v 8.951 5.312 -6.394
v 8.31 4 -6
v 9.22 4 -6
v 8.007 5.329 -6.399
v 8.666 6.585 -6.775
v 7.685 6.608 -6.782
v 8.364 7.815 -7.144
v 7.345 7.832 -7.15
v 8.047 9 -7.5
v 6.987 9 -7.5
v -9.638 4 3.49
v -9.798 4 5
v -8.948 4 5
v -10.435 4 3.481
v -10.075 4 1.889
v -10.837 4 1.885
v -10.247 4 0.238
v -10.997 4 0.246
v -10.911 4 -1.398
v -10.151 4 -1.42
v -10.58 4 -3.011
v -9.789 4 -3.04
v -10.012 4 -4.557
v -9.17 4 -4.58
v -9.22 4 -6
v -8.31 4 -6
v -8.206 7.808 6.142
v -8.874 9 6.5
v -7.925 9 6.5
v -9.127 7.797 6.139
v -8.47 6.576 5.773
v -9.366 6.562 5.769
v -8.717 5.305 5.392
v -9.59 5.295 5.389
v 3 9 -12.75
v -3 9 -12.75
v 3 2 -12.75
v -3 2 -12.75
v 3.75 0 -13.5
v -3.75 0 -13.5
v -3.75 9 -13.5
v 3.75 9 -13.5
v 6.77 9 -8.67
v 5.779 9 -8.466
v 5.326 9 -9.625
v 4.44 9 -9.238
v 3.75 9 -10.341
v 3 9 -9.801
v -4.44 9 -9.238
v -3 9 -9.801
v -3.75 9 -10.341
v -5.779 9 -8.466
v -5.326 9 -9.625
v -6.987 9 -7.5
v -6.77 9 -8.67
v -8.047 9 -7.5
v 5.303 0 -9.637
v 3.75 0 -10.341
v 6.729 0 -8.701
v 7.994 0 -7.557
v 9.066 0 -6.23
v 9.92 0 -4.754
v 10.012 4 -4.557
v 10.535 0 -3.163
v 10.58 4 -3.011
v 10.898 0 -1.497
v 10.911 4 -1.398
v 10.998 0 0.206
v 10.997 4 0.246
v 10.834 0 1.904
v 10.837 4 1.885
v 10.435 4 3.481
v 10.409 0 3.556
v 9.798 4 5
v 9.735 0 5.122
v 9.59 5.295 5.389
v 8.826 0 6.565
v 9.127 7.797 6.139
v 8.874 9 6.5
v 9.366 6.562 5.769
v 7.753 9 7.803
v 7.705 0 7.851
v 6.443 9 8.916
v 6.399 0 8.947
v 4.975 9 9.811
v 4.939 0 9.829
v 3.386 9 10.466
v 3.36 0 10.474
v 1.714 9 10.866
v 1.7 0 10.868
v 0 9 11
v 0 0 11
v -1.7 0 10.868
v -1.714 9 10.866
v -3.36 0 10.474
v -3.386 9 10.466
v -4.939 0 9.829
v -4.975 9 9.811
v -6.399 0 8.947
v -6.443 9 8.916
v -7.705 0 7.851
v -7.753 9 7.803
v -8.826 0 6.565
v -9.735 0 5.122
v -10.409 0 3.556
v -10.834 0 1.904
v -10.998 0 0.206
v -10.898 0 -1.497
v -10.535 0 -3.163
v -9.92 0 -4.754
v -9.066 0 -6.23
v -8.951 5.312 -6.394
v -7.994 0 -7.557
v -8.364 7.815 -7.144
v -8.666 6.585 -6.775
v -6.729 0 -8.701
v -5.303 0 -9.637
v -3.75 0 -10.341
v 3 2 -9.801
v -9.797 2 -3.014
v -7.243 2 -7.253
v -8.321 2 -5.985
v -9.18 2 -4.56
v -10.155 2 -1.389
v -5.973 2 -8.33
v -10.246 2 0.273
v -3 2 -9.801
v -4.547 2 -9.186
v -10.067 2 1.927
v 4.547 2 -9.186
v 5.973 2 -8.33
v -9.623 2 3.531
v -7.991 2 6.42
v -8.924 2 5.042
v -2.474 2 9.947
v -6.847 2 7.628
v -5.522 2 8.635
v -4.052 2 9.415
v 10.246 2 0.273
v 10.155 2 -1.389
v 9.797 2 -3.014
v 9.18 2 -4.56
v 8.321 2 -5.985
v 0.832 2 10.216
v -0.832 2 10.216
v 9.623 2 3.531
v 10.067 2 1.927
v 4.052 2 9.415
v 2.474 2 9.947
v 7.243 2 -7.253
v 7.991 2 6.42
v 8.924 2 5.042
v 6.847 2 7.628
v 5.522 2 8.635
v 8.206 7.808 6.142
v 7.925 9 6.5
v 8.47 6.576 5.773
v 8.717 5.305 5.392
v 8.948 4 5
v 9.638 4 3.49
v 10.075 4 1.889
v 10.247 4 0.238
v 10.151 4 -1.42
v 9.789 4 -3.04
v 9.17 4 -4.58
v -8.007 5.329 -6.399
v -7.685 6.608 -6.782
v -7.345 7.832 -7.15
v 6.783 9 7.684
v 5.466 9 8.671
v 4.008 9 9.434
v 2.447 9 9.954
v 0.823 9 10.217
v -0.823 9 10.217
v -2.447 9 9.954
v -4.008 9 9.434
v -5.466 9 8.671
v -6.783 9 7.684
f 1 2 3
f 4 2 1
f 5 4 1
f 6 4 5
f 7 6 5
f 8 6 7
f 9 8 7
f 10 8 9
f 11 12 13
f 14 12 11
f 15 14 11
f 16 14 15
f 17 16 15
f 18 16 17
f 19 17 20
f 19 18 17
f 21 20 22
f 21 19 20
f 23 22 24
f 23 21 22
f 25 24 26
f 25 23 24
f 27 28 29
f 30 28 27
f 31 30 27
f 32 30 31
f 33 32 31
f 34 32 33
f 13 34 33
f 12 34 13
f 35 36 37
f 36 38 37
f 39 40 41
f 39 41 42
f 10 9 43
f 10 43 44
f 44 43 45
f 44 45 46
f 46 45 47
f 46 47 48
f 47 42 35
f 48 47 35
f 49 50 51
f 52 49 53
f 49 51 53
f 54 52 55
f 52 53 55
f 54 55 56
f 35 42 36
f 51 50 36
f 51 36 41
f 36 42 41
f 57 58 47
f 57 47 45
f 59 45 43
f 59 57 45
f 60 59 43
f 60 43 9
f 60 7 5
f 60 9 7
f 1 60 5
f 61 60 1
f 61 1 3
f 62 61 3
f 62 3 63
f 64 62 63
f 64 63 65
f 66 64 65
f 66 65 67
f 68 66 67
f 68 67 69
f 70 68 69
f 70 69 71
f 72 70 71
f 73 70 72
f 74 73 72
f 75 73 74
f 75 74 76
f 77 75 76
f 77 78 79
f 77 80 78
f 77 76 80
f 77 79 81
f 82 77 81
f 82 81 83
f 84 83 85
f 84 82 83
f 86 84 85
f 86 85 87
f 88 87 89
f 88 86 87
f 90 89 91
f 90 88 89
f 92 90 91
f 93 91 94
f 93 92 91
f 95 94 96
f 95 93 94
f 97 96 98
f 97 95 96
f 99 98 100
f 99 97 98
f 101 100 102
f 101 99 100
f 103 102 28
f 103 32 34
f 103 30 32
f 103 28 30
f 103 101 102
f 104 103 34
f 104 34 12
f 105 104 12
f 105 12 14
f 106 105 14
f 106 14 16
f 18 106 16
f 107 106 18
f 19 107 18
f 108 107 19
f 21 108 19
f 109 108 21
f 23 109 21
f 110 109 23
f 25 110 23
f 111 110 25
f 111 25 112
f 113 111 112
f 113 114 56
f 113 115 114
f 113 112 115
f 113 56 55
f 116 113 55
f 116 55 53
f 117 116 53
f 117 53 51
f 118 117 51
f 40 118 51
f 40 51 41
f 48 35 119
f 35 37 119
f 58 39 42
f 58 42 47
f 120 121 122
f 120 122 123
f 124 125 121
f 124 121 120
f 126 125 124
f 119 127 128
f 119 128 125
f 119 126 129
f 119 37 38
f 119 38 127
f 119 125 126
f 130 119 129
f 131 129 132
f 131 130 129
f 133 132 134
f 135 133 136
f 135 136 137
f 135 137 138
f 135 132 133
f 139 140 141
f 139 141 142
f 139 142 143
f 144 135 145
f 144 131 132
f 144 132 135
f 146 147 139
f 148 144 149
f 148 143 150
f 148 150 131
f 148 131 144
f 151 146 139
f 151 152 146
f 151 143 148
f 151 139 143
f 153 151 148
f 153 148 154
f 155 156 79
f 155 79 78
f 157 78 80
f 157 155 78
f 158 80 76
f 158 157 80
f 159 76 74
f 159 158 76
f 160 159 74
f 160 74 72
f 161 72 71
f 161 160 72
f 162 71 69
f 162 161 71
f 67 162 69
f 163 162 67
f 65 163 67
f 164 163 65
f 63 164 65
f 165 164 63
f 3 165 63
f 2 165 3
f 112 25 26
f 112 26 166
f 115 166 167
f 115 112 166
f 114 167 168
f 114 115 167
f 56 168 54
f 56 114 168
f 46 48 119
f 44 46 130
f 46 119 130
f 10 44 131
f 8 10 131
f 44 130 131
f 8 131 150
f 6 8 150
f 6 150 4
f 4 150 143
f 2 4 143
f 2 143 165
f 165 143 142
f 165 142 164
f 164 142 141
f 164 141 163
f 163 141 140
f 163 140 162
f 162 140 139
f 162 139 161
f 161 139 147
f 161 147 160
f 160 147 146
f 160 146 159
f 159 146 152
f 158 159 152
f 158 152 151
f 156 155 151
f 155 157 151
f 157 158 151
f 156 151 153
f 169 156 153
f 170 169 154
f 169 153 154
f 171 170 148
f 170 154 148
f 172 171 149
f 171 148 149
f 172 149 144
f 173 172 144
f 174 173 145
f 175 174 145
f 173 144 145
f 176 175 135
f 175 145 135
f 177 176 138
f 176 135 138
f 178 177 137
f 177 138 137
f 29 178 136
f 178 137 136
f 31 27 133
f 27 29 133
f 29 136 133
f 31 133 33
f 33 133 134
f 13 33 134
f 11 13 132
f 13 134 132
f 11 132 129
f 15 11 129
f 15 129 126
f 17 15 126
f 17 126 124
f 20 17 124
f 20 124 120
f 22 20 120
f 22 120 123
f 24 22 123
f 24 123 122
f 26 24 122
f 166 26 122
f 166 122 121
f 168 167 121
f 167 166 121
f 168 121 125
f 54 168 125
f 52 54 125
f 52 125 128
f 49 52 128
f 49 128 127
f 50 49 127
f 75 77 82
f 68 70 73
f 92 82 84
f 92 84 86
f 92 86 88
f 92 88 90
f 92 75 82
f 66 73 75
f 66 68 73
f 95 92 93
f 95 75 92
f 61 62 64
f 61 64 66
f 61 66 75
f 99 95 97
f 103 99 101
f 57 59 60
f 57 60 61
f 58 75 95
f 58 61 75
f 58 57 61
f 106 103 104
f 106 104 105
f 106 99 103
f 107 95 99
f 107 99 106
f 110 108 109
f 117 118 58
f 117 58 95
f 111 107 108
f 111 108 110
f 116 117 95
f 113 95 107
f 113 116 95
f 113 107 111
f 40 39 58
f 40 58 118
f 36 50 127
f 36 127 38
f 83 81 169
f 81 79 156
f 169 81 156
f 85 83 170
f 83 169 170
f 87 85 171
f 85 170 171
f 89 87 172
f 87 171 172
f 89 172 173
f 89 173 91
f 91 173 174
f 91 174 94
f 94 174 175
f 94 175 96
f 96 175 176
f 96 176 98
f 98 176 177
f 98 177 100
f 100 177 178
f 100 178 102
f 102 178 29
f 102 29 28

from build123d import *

# Parameters (mm, degrees)
EXTRUDE_1_DEPTH           = 9
SHELL_1_T                 = -0.75
SHELL_1_THICKNESS_2_DEPTH = 1.25
CUT_EXTRUDE_1_DEPTH       = 20.602295784
CUT_EXTRUDE_1_DEPTH_BACK  = 20.602295784


with BuildPart() as part:
    # 草图1 → 凸台-拉伸1 (new body)
    with BuildSketch(Plane(origin=(0, 0, 0), x_dir=(1, 0, 0), z_dir=(0, 1, 0))):
        with BuildLine():
            Line((-3.75, 10.34105894), (-3.75, 13.5))
            Line((-3.75, 13.5), (3.75, 13.5))
            Line((3.75, 13.5), (3.75, 10.34105894))
            ThreePointArc((3.75, 10.34105894), (0, -11), (-3.75, 10.34105894))
        make_face()
    extrude(amount=EXTRUDE_1_DEPTH)

    # 抽壳1
    shell_1_openings = [part.faces().sort_by_distance(p)[0] for p in [
        (0, 9, -0.617377205),
    ]]
    offset(amount=SHELL_1_T, openings=shell_1_openings, kind=Kind.INTERSECTION)

    # 抽壳1 thickness 2 face (on inner face of the shell) → 抽壳1 thickness 2 (add)
    with BuildSketch(Plane(origin=(0, 0.75, -0.524637331), x_dir=(0, 0, -1), z_dir=(0, -1, 0))):
        with BuildLine():
            ThreePointArc((9.276510561, -3), (-10.774637331, 0), (9.276510561, 3))
            Line((9.276510561, 3), (12.225362669, 3))
            Line((12.225362669, 3), (12.225362669, -3))
            Line((12.225362669, -3), (9.276510561, -3))
        make_face()
    extrude(amount=-SHELL_1_THICKNESS_2_DEPTH)

    # 草图2 → 切除-拉伸1 (cut, two sides: drawn at the far end of the back side and taken through both)
    with BuildSketch(Plane(origin=(0, 0, 0), x_dir=(0, 0, -1), z_dir=(1, 0, 0)).offset(-CUT_EXTRUDE_1_DEPTH_BACK)):
        Polygon((-6.5, 9), (-5, 4), (6, 4), (7.5, 9), align=None)
    extrude(amount=CUT_EXTRUDE_1_DEPTH + CUT_EXTRUDE_1_DEPTH_BACK, mode=Mode.SUBTRACT)


solid = part.part
